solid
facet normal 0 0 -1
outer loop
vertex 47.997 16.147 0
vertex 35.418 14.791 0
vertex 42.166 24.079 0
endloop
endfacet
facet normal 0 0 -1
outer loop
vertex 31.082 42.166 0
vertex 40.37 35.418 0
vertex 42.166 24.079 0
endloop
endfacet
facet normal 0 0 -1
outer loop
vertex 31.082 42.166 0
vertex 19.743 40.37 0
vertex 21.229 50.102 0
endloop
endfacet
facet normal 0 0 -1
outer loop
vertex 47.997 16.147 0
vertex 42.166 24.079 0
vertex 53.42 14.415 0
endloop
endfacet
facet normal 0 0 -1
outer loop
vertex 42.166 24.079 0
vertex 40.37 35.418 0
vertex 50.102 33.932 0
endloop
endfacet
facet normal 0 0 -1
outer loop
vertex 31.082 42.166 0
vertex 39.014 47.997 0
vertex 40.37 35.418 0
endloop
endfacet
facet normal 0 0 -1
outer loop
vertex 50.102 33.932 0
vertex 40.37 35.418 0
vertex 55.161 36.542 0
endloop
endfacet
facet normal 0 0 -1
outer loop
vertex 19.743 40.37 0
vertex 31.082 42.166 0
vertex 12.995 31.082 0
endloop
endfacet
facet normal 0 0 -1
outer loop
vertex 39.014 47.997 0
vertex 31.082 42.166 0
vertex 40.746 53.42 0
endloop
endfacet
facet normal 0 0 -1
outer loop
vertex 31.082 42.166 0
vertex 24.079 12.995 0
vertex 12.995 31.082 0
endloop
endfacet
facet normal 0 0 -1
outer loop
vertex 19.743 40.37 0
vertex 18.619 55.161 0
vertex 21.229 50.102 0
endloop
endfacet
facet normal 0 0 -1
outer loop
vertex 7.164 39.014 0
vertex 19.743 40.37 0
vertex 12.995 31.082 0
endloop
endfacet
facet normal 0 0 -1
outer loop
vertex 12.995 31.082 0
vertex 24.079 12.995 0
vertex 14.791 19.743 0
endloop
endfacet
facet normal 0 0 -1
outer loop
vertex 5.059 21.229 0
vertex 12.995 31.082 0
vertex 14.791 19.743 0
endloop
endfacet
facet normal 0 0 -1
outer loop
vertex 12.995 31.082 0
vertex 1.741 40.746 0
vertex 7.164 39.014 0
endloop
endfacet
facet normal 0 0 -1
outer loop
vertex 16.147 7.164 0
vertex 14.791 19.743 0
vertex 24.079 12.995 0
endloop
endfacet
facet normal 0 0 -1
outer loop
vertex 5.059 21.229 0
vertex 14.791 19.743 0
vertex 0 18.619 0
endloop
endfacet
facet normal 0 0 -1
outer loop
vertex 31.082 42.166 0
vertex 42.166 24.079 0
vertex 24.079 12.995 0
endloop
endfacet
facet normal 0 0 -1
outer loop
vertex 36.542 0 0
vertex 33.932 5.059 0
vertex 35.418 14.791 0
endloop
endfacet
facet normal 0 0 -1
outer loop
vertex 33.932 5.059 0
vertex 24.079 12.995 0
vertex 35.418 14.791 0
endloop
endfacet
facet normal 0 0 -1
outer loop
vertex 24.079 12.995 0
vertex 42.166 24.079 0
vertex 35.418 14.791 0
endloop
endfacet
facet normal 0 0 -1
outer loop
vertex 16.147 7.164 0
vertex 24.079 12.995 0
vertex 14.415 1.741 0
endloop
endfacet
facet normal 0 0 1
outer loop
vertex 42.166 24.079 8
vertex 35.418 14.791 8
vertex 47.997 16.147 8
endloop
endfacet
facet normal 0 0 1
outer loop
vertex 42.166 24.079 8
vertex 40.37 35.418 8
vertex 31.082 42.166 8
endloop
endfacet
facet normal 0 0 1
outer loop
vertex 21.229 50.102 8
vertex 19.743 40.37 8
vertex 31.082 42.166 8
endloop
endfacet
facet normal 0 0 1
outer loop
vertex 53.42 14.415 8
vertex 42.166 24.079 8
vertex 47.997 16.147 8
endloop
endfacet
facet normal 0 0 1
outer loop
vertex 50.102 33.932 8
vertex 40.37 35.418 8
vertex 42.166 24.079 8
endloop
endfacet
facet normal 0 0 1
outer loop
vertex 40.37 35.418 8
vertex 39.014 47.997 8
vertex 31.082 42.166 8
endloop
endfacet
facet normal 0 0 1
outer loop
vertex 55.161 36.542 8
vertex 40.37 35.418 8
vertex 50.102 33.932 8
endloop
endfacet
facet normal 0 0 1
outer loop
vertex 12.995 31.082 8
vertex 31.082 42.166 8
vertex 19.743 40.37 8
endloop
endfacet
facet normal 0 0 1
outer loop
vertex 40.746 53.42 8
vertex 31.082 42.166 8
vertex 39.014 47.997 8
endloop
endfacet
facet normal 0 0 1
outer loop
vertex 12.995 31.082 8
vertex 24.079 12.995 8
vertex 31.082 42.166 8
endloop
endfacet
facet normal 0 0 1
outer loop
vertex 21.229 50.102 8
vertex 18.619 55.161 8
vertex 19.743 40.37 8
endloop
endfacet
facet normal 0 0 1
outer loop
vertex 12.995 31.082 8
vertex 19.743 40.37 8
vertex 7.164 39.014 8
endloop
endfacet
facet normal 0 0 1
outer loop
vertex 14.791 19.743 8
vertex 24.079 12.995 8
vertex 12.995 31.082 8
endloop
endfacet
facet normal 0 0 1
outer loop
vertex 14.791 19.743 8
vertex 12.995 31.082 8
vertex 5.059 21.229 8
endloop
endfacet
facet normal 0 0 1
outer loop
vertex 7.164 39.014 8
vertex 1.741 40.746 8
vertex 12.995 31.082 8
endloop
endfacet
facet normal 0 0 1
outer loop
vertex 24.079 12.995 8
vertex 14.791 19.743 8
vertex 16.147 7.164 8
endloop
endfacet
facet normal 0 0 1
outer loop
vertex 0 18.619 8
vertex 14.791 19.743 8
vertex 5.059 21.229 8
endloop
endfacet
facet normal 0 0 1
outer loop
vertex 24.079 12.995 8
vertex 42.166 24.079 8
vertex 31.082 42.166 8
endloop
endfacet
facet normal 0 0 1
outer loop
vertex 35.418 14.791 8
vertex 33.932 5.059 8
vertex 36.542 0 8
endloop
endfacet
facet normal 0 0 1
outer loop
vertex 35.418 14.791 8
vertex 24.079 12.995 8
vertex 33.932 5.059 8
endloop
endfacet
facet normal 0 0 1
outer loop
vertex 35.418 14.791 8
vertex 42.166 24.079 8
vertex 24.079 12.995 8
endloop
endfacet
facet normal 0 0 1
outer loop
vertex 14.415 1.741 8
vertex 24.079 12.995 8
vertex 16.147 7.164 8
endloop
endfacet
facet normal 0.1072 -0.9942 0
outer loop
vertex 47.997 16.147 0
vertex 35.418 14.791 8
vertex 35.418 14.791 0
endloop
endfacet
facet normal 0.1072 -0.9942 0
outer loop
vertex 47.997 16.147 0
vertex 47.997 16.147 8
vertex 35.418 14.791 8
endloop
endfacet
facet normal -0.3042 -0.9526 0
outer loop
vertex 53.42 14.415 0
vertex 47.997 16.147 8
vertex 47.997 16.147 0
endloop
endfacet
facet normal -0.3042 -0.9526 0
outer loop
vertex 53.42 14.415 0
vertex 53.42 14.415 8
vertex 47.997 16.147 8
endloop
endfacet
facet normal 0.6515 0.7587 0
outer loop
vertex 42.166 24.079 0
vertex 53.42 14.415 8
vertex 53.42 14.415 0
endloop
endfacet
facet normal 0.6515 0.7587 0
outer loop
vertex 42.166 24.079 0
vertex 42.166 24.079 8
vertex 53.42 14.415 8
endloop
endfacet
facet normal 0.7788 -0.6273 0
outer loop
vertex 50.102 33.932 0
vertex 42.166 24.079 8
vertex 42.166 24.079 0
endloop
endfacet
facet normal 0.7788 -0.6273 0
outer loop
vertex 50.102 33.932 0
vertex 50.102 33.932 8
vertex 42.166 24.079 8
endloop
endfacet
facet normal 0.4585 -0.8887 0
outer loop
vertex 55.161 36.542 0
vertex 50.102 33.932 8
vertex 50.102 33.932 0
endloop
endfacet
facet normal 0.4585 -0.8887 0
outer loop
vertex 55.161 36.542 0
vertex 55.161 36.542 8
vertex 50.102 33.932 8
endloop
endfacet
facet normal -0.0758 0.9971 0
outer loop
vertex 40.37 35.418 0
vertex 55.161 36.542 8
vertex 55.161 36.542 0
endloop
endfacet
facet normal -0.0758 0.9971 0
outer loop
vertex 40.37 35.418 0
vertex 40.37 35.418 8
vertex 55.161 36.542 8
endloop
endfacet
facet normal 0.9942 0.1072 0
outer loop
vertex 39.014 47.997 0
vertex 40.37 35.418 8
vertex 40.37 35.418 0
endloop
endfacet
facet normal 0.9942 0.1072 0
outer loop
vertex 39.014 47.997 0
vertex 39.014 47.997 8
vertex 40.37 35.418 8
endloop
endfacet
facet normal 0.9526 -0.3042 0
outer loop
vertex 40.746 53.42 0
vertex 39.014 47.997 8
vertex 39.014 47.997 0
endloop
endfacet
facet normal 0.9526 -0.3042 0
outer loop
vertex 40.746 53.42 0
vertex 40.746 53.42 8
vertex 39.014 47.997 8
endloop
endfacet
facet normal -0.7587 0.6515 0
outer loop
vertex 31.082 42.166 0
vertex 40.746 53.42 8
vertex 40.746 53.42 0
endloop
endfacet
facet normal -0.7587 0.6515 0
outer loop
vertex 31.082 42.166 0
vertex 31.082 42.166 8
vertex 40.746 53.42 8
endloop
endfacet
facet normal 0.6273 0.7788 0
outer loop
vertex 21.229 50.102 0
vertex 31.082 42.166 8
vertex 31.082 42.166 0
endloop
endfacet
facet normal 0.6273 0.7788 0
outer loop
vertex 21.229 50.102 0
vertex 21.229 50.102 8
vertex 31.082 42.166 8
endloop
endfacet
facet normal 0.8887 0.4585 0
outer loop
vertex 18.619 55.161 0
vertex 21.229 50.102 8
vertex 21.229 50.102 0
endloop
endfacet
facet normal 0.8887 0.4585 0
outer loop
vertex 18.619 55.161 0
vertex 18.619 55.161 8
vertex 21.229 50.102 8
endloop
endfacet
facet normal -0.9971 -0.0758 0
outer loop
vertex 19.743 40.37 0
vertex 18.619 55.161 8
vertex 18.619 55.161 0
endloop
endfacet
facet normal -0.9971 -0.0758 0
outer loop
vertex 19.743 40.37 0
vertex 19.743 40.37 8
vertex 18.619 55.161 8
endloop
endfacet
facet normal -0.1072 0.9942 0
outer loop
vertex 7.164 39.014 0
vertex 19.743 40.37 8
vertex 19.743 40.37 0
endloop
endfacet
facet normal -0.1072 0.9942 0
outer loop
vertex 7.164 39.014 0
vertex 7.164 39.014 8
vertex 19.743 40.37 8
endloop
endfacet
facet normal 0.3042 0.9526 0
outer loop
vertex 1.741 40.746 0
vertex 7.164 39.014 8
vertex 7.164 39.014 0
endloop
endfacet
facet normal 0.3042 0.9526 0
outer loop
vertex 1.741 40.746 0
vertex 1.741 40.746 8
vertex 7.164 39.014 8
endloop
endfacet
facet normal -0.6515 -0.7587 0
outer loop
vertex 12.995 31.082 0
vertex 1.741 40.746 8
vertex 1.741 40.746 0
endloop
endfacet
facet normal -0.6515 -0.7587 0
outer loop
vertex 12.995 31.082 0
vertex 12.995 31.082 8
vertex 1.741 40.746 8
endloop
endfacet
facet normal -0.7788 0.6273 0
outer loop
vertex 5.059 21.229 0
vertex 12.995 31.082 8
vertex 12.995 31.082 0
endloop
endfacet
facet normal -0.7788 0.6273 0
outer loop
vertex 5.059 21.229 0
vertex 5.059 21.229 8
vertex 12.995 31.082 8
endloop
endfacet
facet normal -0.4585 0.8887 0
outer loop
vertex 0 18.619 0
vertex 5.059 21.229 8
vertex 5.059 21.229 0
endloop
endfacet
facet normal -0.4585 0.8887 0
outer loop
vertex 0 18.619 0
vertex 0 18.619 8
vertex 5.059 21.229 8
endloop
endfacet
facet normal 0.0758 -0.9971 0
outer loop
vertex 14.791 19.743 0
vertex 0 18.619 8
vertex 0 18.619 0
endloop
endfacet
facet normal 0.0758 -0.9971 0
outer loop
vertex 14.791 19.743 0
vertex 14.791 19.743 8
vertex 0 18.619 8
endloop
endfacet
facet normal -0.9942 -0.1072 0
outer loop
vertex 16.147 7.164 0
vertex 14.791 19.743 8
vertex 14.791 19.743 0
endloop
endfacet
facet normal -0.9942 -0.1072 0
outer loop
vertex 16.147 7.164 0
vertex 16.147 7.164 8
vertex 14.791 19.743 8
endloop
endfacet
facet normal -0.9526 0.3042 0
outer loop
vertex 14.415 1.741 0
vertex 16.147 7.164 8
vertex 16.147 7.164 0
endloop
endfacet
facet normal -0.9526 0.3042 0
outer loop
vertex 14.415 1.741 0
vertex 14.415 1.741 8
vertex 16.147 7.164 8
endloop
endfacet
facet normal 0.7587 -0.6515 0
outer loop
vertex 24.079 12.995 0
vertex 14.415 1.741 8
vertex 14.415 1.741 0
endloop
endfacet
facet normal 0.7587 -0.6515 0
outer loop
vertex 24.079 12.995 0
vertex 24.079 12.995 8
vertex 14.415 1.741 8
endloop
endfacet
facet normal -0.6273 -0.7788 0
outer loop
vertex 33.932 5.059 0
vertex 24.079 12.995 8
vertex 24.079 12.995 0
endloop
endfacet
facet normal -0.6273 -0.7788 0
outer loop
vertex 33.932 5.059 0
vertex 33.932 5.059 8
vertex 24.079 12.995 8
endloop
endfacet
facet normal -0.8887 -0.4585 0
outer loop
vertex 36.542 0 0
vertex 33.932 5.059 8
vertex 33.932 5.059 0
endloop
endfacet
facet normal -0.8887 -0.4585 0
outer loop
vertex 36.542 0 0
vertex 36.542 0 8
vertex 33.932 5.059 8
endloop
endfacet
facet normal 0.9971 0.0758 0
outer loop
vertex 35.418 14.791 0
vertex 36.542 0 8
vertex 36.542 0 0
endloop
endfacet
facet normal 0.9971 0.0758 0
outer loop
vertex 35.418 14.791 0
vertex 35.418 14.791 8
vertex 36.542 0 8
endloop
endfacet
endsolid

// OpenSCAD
$fn = 32;

// ----------------------------------------------------------------------
// Fan rotor section: 8 blades, 15 mm hub radius, 14 mm blades
// ----------------------------------------------------------------------

// --- parameters (mm) ---
profile_height = 8;       // extrusion height
profile_points = 24;      // points of the closed outline

profile = [[42.166, 24.079], [50.102, 33.932], [55.161, 36.542], [40.37, 35.418], [39.014, 47.997], [40.746, 53.42], [31.082, 42.166], [21.229, 50.102], [18.619, 55.161], [19.743, 40.37], [7.164, 39.014], [1.741, 40.746], [12.995, 31.082], [5.059, 21.229], [0, 18.619], [14.791, 19.743], [16.147, 7.164], [14.415, 1.741], [24.079, 12.995], [33.932, 5.059], [36.542, 0], [35.418, 14.791], [47.997, 16.147], [53.42, 14.415]];  // single closed polygon, 24 points, counter clockwise

// --- the one profile operation ---
linear_extrude(height = profile_height) polygon(points = profile);
